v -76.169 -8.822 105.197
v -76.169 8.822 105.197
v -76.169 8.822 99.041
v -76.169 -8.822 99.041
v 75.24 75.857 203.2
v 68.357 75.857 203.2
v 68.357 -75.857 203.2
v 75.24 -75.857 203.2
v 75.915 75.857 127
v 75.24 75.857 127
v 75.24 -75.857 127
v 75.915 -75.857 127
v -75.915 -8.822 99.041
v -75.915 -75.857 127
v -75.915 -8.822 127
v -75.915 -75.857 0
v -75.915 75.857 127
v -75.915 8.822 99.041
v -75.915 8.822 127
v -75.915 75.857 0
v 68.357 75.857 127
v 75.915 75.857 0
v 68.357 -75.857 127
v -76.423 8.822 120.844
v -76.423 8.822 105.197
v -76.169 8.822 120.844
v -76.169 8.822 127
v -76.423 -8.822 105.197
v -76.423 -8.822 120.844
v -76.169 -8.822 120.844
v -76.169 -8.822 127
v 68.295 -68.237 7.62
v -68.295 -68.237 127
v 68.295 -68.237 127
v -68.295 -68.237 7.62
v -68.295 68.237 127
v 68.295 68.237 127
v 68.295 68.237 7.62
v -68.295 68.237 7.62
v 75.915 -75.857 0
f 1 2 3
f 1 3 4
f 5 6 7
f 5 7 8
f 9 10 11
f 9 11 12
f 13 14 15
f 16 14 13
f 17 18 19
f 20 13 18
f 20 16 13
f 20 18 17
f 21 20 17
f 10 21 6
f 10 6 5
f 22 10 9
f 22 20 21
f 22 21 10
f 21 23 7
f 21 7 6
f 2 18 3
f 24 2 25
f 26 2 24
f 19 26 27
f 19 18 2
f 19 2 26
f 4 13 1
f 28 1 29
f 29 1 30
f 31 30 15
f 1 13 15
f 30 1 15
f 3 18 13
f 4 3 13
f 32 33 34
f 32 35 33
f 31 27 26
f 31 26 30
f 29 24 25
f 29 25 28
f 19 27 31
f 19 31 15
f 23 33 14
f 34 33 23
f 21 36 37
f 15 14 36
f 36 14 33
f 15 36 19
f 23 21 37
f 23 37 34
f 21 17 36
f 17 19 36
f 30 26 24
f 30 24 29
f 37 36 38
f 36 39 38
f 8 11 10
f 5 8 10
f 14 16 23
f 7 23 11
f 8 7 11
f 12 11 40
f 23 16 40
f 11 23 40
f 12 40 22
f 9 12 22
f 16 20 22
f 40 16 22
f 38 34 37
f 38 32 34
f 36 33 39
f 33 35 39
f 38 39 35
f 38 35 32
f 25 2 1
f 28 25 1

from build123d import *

# Parameters (mm, degrees)
F0_W     = 151.8304795027
F0_H     = 151.7131924629
F1_DEPTH = 127
F2_T     = -7.62
F3_W     = 6.8829804659
F3_H     = 151.7131924629
F4_DEPTH = 76.2
F5_W     = 17.6434051245
F5_H     = 27.9590406418
F6_DEPTH = 0.254
F7_W     = 17.6434051245
F7_H     = 15.647560358
F8_DEPTH = 0.254


with BuildPart() as f1:
    # F0 (on Top) → F1 (new body)
    with BuildSketch(Plane.XY):
        Rectangle(F0_W, F0_H)
    extrude(amount=F1_DEPTH)

    # F2
    f2_openings = [f1.faces().sort_by_distance(p)[0] for p in [
        (0, 0, 127),
    ]]
    offset(amount=F2_T, openings=f2_openings)

    # F3 (on face) → F4 (join)
    with BuildSketch(Plane.XY.offset(127)):
        with Locations((71.7989727855, 0)):
            Rectangle(F3_W, F3_H)
    extrude(amount=F4_DEPTH)

    # F5 (on face) → F6 (join)
    with BuildSketch(Plane(origin=(-75.9152397513, 0, 0), x_dir=(0, -1, 0), z_dir=(-1, 0, 0))):
        with Locations((0, 113.0204796791)):
            Rectangle(F5_W, F5_H)
    extrude(amount=F6_DEPTH)

    # F7 (on face) → F8 (join)
    with BuildSketch(Plane(origin=(-76.1692397513, 0, 0), x_dir=(0, -1, 0), z_dir=(-1, 0, 0))):
        with Locations((0, 113.0204796791)):
            Rectangle(F7_W, F7_H)
    extrude(amount=F8_DEPTH)


solid = f1.part
